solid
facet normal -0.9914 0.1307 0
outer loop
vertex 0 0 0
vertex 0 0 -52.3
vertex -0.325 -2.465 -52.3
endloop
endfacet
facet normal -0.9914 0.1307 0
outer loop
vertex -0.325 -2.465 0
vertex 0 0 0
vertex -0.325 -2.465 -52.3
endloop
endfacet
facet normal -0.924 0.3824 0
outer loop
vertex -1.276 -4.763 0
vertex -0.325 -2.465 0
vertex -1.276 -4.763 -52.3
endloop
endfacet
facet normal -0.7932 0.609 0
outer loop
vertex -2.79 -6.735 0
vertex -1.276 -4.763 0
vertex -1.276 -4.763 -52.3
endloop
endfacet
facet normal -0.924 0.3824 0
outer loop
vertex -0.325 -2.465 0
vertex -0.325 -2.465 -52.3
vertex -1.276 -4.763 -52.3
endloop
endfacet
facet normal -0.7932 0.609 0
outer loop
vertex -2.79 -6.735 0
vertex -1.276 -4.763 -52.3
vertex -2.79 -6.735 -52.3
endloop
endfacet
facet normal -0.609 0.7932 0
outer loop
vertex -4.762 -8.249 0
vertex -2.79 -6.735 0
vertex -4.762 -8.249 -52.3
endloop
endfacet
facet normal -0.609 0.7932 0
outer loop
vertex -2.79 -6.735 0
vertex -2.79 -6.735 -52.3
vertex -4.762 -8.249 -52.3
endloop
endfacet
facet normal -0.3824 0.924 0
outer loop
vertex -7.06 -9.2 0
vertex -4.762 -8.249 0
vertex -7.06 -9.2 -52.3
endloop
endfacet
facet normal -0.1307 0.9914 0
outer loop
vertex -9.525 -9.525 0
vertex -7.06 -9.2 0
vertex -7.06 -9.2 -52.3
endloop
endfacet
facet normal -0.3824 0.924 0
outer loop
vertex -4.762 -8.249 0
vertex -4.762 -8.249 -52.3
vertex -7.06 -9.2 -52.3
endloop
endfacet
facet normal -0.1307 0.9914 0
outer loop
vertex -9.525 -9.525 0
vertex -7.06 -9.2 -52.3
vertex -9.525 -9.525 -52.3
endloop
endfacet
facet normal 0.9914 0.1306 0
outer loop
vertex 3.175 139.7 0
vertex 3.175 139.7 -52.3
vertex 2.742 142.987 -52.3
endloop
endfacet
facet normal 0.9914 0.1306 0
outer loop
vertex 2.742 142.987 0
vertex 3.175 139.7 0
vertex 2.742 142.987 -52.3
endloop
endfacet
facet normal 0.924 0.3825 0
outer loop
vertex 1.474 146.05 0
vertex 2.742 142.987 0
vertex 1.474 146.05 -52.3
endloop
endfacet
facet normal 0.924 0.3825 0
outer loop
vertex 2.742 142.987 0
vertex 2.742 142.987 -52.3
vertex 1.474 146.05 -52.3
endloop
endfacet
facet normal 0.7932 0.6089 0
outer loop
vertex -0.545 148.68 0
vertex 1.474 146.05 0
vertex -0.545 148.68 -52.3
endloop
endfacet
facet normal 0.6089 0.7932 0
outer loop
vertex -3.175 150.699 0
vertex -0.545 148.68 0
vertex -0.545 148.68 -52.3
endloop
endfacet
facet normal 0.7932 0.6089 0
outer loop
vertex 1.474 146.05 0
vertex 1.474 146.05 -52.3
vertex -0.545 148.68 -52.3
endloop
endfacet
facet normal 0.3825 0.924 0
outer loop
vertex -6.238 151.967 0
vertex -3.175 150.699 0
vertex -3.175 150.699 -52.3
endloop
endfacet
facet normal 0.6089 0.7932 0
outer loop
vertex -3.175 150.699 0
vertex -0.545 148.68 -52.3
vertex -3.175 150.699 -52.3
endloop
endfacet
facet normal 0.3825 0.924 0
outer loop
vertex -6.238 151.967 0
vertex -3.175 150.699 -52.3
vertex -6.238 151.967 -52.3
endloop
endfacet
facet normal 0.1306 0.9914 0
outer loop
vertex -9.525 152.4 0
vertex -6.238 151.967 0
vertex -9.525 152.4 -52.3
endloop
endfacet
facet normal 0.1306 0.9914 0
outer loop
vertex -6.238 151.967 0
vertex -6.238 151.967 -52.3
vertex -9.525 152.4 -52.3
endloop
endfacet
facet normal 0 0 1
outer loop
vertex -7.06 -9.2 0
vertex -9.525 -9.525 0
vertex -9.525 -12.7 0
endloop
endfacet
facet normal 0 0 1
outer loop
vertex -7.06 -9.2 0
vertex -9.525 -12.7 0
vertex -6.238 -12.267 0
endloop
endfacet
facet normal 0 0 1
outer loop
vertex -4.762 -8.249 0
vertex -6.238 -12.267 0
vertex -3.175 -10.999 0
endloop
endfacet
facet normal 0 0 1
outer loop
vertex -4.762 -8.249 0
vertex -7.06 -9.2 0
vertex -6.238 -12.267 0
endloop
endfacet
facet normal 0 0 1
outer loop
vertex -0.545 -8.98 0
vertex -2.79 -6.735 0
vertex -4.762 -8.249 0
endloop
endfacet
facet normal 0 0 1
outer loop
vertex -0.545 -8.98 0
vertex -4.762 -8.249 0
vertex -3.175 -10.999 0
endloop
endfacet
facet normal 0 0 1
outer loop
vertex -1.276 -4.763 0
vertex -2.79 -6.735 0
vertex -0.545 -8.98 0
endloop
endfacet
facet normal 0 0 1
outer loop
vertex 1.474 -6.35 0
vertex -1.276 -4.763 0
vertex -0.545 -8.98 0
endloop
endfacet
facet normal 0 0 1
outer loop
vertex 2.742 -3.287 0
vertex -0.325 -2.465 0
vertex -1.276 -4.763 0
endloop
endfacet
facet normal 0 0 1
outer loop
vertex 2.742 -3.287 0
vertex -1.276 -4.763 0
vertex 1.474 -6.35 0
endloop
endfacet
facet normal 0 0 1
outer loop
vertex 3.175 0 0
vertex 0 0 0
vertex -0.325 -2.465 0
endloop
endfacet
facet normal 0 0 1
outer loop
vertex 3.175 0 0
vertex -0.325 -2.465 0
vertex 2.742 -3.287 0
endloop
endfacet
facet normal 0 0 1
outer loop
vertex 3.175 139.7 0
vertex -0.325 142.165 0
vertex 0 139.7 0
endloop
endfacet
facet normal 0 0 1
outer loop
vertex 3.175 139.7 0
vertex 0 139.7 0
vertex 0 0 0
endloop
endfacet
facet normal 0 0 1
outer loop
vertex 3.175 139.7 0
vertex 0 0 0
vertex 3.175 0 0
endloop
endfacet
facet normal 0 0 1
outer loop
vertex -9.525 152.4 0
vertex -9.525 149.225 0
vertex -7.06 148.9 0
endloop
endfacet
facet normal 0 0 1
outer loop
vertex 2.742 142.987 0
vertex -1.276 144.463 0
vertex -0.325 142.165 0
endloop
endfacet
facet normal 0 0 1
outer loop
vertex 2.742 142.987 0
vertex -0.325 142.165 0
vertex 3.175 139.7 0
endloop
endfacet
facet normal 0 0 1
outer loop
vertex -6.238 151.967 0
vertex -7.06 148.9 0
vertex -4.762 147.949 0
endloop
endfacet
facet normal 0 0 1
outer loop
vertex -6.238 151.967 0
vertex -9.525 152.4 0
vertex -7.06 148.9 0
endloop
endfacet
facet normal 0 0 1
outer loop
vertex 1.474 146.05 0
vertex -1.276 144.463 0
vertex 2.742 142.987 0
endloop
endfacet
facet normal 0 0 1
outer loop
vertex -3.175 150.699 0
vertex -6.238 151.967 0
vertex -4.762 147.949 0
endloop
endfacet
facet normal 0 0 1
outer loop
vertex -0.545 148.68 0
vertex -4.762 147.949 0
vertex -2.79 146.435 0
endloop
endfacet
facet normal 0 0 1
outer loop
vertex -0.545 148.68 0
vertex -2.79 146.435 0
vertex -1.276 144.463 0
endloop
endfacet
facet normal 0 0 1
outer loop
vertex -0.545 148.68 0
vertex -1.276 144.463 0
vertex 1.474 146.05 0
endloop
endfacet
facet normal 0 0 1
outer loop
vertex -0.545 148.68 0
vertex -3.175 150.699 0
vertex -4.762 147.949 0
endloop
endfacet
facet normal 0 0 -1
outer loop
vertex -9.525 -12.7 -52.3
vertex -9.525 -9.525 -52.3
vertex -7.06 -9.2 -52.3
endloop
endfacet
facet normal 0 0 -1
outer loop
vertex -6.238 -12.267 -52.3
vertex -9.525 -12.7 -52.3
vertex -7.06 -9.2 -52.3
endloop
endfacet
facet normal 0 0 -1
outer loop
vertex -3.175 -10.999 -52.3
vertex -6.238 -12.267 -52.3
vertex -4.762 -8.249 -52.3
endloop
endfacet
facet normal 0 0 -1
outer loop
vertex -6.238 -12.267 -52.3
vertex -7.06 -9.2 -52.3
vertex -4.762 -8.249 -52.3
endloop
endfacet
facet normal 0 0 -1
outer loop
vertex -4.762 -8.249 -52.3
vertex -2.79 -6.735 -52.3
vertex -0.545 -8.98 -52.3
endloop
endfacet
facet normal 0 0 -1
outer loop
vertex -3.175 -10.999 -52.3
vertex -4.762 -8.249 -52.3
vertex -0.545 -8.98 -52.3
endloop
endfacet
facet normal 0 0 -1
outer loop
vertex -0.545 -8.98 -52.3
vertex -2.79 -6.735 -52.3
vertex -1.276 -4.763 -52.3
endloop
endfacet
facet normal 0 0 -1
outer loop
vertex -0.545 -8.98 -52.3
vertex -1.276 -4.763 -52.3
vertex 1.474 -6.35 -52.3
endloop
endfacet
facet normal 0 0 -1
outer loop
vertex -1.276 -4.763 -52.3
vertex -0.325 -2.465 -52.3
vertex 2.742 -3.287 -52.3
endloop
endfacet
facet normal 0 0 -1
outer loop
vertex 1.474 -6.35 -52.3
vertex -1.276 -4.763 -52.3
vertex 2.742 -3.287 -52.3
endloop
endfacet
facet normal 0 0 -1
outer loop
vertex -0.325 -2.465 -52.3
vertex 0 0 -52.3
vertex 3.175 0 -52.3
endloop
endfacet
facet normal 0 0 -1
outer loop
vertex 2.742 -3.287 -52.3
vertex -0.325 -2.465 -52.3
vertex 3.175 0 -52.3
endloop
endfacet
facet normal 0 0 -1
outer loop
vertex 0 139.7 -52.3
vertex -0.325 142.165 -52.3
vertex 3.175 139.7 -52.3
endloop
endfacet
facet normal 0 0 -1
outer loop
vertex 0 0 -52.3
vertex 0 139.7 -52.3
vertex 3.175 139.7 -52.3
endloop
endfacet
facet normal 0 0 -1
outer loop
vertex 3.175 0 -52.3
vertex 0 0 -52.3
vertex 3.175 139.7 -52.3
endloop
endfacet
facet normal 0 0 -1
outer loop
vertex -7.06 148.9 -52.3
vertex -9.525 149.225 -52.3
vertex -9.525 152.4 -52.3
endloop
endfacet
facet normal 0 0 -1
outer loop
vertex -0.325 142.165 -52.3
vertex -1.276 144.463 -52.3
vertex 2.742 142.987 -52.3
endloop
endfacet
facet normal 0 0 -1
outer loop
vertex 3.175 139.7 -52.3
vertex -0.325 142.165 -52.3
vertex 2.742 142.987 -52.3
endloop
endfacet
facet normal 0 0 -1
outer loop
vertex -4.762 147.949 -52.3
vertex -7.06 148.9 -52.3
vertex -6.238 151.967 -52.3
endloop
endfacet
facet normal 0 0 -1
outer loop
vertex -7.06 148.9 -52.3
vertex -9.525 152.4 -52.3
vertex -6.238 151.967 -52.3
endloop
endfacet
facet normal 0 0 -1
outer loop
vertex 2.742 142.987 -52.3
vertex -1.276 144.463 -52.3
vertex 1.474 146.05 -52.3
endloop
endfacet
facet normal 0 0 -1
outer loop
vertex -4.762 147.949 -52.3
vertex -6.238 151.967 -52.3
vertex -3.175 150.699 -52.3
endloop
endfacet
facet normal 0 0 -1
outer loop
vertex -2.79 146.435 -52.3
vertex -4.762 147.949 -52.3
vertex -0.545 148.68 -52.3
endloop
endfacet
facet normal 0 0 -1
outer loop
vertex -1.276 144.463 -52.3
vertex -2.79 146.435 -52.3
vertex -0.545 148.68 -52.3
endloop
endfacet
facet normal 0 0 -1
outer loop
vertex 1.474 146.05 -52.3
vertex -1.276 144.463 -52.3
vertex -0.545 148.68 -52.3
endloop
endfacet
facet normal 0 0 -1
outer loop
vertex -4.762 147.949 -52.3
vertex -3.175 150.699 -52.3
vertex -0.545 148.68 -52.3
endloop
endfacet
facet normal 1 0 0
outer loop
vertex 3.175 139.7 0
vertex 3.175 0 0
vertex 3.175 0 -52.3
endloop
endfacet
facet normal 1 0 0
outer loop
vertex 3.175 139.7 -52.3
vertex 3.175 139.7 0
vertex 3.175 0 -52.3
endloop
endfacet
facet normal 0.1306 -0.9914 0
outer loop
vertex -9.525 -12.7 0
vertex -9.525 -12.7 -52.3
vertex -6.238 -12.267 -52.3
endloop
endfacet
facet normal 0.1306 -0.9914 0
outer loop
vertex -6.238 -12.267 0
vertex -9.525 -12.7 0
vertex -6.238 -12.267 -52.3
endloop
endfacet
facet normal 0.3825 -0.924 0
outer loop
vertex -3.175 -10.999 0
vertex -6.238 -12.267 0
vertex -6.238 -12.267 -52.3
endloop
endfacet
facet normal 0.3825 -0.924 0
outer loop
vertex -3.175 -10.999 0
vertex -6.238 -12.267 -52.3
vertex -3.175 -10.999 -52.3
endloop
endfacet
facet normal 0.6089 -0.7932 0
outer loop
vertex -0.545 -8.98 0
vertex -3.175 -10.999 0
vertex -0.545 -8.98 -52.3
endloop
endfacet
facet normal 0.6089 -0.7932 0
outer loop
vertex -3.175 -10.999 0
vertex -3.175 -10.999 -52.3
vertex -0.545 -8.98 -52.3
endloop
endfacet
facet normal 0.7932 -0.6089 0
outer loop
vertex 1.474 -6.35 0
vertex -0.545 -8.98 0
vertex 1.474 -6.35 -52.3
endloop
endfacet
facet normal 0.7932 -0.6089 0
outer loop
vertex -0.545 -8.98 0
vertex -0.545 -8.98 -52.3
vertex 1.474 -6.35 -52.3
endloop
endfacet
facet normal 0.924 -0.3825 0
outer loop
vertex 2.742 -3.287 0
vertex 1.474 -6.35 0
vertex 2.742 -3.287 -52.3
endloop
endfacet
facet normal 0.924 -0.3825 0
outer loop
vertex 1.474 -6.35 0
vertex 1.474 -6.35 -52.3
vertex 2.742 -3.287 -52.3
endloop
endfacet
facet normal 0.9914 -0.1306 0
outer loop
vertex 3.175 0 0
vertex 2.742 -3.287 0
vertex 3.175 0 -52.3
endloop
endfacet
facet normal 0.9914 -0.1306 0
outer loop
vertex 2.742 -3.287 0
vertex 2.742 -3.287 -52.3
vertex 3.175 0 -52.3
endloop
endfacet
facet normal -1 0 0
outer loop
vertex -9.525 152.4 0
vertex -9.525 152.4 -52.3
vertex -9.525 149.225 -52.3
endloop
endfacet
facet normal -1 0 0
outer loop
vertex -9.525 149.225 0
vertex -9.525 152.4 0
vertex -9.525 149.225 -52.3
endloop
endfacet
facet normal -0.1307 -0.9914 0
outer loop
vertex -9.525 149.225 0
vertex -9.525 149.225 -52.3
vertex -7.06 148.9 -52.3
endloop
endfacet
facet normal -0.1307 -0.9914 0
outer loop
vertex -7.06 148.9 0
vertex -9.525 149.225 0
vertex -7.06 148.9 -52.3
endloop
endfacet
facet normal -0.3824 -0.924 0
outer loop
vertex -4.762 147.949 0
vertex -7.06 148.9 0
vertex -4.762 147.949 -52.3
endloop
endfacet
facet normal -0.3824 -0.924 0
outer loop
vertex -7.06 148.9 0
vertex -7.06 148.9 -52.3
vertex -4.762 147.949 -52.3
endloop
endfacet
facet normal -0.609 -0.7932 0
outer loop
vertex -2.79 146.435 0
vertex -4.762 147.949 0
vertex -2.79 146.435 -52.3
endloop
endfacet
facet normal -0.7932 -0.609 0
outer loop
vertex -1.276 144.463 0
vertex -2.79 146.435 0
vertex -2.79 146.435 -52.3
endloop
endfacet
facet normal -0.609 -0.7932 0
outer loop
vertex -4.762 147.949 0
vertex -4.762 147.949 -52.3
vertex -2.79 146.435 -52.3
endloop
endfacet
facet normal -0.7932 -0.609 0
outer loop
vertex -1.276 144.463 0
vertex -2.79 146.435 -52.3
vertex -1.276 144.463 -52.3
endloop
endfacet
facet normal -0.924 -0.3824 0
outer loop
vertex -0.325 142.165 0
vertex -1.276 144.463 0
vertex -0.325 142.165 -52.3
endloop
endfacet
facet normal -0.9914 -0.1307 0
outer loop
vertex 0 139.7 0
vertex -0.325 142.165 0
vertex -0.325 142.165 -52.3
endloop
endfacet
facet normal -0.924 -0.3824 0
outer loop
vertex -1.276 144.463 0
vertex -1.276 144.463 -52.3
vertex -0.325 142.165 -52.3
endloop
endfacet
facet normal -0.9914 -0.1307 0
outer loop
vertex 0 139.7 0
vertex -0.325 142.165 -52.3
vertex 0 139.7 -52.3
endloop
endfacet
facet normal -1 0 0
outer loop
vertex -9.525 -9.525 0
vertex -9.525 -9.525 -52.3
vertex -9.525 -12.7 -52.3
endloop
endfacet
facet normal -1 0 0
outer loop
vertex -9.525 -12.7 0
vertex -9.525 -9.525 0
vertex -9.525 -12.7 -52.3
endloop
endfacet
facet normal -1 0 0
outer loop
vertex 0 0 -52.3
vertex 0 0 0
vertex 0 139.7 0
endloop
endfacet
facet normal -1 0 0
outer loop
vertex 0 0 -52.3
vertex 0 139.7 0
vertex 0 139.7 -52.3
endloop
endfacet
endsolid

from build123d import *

# Parameters (mm, degrees)
SKETCH1_W           = 52.300000048
SKETCH1_H           = 139.7
BOSS_EXTRUDE1_DEPTH = 3.175
BOSS_EXTRUDE2_DEPTH = 52.300000048


with BuildPart() as part:
    # Sketch1 → Boss-Extrude1 (new body)
    with BuildSketch(Plane(origin=(0, 0, 0), x_dir=(0, 0, -1), z_dir=(1, 0, 0))):
        with Locations((26.150000024, 69.85)):
            Rectangle(SKETCH1_W, SKETCH1_H)
    extrude(amount=BOSS_EXTRUDE1_DEPTH)

    # Sketch2 → Boss-Extrude2 (add)
    with BuildSketch(Plane(origin=(0, 0, -52.300000048), x_dir=(-1, 0, 0), z_dir=(0, 0, -1))):
        with BuildLine():
            Line((9.525, -9.525), (9.525, -12.7))
            ThreePointArc((9.525, -12.7), (0.544743879, -8.980256121), (-3.175, 0))
            Line((-3.175, 0), (0, 0))
            ThreePointArc((0, 0), (2.789807909, -6.735192091), (9.525, -9.525))
        make_face()
        with BuildLine():
            Line((0, 139.7), (-3.175, 139.7))
            ThreePointArc((-3.175, 139.7), (0.544743879, 148.680256121), (9.525, 152.4))
            Line((9.525, 152.4), (9.525, 149.225))
            ThreePointArc((9.525, 149.225), (2.789807909, 146.435192091), (0, 139.7))
        make_face()
    extrude(amount=-BOSS_EXTRUDE2_DEPTH)


solid = part.part
